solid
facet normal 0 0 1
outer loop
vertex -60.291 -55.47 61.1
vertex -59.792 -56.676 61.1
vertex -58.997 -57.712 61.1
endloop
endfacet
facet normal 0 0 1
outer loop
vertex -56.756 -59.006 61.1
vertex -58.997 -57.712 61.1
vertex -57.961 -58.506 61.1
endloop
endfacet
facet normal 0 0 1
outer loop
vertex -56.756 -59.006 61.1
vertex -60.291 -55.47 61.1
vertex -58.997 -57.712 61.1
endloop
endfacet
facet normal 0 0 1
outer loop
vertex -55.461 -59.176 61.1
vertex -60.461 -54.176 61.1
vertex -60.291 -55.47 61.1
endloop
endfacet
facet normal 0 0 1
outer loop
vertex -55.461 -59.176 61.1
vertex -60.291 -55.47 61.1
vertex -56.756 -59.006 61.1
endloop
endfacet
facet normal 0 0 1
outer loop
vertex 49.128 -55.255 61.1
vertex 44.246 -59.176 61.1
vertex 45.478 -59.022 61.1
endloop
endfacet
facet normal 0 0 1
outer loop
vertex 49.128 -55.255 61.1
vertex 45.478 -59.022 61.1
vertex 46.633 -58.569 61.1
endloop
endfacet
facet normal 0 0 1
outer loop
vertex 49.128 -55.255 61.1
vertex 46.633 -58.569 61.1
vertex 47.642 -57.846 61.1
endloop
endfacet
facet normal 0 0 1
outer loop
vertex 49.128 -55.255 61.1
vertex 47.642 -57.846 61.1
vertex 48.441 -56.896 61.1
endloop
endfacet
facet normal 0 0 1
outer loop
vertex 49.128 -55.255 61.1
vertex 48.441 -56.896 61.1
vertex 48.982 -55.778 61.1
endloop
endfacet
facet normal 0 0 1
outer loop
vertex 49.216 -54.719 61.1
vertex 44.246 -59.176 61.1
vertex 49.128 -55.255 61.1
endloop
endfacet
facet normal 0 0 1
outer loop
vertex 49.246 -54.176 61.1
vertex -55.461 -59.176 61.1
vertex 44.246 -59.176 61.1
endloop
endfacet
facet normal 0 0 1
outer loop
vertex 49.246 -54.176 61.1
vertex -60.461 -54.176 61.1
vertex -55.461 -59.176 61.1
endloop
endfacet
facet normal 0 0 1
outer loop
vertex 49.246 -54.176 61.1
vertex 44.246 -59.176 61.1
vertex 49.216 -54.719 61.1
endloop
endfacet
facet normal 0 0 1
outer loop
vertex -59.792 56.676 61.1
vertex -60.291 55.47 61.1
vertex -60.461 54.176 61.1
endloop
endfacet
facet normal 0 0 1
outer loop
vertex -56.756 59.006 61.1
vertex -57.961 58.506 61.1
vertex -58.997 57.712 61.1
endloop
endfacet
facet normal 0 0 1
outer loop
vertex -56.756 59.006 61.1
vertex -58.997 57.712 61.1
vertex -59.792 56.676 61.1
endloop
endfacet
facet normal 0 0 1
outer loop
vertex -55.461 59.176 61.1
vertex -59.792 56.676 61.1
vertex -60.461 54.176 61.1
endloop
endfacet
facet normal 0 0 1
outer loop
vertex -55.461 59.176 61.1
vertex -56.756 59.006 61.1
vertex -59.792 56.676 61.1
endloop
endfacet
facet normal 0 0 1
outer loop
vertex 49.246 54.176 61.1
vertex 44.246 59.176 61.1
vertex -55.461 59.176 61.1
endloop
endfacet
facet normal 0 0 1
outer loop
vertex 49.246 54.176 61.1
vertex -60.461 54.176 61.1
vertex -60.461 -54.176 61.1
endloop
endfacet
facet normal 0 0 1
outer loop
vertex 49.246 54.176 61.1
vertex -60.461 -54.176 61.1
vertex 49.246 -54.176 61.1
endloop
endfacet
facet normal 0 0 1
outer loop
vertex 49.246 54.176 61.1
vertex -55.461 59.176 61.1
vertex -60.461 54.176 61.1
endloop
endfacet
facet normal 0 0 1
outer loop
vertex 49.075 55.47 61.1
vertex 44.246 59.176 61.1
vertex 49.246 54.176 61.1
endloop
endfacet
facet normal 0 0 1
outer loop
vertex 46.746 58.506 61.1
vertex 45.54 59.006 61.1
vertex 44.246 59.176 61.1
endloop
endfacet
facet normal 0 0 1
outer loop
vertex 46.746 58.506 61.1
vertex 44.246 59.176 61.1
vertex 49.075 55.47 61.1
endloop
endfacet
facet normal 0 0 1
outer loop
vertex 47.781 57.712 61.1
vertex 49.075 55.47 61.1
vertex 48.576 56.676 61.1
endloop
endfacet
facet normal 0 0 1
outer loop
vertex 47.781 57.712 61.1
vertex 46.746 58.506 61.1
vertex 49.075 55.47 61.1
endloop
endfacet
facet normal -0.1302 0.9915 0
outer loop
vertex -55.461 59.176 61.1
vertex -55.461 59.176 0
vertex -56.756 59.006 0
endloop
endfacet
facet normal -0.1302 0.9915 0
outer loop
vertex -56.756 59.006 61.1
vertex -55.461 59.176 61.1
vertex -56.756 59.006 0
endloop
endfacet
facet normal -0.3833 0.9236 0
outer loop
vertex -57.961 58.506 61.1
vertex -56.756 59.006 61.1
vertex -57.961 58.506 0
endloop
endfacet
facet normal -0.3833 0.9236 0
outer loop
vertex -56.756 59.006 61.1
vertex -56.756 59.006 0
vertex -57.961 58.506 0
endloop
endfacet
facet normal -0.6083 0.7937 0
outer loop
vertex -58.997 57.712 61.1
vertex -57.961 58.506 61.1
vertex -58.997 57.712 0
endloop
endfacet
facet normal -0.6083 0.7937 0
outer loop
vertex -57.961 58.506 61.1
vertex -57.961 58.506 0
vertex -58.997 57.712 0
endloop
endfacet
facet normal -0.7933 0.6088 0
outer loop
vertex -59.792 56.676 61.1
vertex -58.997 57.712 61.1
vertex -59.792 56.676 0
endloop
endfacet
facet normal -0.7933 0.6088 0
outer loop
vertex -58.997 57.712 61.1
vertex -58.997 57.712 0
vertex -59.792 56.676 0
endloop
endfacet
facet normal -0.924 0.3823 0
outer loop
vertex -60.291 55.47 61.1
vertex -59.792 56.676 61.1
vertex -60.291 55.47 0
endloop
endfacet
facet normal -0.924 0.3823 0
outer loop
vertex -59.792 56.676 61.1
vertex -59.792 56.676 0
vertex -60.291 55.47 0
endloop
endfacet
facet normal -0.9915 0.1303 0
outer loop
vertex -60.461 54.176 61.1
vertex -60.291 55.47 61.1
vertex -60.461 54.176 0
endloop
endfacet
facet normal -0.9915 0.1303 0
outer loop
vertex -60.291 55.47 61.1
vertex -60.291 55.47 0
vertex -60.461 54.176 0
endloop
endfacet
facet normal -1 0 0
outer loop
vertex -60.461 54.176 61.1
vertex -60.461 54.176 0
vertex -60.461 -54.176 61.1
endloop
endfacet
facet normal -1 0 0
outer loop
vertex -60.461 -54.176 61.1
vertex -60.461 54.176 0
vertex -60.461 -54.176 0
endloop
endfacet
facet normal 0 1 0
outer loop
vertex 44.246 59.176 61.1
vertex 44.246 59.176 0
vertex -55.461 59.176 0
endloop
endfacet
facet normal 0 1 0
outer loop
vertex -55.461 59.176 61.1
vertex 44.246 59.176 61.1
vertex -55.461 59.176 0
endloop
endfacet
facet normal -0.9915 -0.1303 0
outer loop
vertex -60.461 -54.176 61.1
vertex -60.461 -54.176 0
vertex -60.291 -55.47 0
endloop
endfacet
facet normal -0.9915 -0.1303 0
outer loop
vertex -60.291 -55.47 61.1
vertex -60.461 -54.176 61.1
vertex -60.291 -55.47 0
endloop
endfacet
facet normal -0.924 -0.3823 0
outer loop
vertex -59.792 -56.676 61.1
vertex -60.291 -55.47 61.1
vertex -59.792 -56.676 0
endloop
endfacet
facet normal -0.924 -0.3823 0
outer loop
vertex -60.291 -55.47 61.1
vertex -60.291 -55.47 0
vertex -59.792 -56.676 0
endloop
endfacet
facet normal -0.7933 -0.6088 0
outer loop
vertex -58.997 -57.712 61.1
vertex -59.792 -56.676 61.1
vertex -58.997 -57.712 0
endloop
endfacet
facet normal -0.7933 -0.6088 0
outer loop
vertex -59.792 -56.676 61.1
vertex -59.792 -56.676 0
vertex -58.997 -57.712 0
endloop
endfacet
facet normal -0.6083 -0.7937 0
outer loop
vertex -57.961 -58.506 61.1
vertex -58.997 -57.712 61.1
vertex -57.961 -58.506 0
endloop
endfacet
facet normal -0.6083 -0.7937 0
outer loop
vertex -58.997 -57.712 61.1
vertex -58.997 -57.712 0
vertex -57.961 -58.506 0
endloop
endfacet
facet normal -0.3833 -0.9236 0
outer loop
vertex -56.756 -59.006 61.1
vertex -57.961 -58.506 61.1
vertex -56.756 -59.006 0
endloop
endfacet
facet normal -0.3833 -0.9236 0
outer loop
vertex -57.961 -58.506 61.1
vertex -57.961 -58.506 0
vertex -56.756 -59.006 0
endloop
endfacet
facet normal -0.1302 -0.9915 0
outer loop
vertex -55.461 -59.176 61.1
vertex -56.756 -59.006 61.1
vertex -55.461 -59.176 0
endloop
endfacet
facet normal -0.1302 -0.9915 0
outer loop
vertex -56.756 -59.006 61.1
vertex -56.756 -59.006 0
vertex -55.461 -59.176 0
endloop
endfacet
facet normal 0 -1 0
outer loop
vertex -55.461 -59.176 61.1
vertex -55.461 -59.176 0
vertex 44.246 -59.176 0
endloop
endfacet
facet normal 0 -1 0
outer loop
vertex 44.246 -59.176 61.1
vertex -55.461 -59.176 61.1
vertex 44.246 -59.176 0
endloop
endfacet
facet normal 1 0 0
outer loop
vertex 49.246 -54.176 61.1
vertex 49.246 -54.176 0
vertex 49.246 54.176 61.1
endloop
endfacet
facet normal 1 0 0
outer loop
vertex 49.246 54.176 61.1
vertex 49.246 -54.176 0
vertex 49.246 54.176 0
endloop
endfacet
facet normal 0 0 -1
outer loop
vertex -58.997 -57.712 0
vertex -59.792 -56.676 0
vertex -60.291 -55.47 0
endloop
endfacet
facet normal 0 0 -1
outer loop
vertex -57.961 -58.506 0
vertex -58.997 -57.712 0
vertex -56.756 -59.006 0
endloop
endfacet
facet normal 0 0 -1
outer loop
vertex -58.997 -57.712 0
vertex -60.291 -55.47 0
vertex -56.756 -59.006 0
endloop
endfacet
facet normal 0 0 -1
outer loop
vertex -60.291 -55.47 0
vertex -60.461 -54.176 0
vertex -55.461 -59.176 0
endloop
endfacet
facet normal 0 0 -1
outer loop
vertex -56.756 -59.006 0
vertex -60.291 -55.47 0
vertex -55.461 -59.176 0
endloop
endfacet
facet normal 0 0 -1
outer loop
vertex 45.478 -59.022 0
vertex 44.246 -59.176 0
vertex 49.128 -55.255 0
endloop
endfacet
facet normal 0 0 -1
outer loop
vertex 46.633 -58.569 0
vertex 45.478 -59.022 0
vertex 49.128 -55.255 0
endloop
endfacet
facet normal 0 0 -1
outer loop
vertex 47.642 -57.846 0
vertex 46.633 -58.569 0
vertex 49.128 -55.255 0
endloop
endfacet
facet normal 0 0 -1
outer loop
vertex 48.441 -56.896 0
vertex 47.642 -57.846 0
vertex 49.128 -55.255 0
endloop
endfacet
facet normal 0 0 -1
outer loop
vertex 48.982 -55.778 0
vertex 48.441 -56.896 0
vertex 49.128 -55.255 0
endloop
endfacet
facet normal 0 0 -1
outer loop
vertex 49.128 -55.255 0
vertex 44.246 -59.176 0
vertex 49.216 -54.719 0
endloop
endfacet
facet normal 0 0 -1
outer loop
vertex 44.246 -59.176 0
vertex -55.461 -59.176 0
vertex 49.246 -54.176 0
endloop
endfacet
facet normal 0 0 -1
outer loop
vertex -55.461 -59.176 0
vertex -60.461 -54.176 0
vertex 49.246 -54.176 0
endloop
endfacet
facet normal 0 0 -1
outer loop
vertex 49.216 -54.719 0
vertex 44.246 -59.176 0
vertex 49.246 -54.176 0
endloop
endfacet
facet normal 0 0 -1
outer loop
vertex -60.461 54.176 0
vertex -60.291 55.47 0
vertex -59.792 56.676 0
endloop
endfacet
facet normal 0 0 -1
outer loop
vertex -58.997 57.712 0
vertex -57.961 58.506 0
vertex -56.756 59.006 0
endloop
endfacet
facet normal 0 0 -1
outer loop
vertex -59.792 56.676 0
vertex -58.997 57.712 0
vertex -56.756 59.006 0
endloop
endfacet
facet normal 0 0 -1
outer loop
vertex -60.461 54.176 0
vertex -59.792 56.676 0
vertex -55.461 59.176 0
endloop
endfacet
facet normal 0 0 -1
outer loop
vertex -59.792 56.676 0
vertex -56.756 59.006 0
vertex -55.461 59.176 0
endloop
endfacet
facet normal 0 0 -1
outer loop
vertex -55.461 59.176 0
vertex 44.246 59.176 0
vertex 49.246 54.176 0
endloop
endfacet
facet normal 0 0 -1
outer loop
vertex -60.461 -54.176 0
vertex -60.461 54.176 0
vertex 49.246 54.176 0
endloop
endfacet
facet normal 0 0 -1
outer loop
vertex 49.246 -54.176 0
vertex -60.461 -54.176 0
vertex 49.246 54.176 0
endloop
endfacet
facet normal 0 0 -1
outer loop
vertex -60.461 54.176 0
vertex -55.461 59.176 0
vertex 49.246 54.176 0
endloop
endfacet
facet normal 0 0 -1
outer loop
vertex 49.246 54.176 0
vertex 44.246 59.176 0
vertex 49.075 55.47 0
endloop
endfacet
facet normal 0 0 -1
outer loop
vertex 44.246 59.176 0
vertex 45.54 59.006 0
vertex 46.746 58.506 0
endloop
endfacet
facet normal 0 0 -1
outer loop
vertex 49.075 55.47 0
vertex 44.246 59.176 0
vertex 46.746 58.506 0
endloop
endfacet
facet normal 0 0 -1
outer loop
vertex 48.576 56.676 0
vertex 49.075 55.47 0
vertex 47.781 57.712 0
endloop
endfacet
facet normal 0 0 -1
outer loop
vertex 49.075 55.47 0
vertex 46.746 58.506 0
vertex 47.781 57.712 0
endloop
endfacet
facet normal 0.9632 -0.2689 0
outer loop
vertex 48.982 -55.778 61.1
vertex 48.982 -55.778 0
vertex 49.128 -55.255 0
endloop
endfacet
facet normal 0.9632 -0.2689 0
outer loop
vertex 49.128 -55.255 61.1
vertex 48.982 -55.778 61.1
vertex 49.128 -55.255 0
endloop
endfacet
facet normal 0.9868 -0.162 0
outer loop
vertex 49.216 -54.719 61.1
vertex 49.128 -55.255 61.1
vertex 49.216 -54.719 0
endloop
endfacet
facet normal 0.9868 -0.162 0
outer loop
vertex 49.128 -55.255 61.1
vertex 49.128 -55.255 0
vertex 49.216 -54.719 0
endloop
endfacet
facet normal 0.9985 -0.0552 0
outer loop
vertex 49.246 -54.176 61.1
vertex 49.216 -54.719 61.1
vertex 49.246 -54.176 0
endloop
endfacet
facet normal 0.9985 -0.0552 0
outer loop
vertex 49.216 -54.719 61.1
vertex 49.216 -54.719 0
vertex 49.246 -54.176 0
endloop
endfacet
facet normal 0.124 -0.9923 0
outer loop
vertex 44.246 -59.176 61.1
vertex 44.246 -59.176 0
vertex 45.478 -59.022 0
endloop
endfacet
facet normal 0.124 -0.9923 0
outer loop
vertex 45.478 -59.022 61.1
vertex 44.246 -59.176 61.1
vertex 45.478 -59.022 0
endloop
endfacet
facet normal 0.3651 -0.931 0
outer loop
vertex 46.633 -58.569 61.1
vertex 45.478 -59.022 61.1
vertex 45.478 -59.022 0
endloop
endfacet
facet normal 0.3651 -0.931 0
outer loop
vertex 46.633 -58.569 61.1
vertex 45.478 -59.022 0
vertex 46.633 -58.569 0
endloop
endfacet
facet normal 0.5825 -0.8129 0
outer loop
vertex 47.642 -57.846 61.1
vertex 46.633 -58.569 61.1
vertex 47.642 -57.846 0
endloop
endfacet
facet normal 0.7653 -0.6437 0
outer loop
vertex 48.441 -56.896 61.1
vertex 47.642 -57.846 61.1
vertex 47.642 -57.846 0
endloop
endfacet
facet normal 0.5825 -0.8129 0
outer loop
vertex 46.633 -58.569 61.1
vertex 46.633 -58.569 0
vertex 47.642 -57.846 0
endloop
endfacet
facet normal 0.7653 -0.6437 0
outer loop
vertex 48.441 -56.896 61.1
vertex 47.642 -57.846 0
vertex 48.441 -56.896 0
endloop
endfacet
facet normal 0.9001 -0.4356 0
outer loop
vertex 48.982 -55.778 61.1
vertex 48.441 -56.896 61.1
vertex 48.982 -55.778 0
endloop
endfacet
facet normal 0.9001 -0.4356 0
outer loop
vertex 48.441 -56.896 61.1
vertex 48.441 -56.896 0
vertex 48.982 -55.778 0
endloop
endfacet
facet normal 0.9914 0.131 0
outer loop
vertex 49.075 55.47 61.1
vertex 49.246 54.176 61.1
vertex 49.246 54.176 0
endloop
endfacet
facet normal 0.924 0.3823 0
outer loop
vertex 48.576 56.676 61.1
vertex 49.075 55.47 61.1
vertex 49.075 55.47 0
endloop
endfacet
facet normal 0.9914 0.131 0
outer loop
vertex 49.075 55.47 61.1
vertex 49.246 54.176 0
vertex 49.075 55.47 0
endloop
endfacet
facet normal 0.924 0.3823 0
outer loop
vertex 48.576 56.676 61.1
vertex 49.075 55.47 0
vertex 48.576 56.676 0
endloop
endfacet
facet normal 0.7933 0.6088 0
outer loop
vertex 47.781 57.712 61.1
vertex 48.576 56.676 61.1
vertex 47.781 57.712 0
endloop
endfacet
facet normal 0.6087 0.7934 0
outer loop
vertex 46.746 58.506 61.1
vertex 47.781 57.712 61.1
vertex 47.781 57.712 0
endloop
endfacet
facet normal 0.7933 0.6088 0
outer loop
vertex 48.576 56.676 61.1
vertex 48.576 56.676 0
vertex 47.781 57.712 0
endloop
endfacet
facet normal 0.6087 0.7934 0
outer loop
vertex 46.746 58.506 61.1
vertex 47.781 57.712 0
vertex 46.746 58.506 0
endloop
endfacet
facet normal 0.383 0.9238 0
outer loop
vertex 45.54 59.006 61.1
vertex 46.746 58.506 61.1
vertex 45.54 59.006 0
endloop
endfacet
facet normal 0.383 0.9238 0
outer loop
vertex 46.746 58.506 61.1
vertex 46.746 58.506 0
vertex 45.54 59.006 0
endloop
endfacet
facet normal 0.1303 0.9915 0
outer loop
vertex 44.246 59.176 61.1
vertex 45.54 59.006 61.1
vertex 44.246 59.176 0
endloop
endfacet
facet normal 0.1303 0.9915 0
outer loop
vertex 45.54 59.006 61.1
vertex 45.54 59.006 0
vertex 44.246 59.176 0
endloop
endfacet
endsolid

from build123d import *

# Parameters (mm, degrees)
F1_DEPTH = 61.1


with BuildPart() as f1:
    # F0 (on Top) → F1 (new body)
    with BuildSketch(Plane.XY):
        with BuildLine():
            Line((-55.461415, -59.176302), (44.24565, -59.176302))
            ThreePointArc((44.24565, -59.176302), (47.160367, -58.238866), (48.982139, -55.778073))
            ThreePointArc((48.982139, -55.778073), (49.179332, -54.987952), (49.24565, -54.176302))
            Line((49.24565, -54.176302), (49.24565, 54.176302))
            ThreePointArc((49.24565, 54.176302), (47.781184, 57.711835), (44.24565, 59.176302))
            Line((44.24565, 59.176302), (-55.461415, 59.176302))
            ThreePointArc((-55.461415, 59.176302), (-58.996949, 57.711835), (-60.461415, 54.176302))
            Line((-60.461415, 54.176302), (-60.461415, -54.176302))
            ThreePointArc((-60.461415, -54.176302), (-58.996949, -57.711835), (-55.461415, -59.176302))
        make_face()
    extrude(amount=F1_DEPTH)


solid = f1.part
